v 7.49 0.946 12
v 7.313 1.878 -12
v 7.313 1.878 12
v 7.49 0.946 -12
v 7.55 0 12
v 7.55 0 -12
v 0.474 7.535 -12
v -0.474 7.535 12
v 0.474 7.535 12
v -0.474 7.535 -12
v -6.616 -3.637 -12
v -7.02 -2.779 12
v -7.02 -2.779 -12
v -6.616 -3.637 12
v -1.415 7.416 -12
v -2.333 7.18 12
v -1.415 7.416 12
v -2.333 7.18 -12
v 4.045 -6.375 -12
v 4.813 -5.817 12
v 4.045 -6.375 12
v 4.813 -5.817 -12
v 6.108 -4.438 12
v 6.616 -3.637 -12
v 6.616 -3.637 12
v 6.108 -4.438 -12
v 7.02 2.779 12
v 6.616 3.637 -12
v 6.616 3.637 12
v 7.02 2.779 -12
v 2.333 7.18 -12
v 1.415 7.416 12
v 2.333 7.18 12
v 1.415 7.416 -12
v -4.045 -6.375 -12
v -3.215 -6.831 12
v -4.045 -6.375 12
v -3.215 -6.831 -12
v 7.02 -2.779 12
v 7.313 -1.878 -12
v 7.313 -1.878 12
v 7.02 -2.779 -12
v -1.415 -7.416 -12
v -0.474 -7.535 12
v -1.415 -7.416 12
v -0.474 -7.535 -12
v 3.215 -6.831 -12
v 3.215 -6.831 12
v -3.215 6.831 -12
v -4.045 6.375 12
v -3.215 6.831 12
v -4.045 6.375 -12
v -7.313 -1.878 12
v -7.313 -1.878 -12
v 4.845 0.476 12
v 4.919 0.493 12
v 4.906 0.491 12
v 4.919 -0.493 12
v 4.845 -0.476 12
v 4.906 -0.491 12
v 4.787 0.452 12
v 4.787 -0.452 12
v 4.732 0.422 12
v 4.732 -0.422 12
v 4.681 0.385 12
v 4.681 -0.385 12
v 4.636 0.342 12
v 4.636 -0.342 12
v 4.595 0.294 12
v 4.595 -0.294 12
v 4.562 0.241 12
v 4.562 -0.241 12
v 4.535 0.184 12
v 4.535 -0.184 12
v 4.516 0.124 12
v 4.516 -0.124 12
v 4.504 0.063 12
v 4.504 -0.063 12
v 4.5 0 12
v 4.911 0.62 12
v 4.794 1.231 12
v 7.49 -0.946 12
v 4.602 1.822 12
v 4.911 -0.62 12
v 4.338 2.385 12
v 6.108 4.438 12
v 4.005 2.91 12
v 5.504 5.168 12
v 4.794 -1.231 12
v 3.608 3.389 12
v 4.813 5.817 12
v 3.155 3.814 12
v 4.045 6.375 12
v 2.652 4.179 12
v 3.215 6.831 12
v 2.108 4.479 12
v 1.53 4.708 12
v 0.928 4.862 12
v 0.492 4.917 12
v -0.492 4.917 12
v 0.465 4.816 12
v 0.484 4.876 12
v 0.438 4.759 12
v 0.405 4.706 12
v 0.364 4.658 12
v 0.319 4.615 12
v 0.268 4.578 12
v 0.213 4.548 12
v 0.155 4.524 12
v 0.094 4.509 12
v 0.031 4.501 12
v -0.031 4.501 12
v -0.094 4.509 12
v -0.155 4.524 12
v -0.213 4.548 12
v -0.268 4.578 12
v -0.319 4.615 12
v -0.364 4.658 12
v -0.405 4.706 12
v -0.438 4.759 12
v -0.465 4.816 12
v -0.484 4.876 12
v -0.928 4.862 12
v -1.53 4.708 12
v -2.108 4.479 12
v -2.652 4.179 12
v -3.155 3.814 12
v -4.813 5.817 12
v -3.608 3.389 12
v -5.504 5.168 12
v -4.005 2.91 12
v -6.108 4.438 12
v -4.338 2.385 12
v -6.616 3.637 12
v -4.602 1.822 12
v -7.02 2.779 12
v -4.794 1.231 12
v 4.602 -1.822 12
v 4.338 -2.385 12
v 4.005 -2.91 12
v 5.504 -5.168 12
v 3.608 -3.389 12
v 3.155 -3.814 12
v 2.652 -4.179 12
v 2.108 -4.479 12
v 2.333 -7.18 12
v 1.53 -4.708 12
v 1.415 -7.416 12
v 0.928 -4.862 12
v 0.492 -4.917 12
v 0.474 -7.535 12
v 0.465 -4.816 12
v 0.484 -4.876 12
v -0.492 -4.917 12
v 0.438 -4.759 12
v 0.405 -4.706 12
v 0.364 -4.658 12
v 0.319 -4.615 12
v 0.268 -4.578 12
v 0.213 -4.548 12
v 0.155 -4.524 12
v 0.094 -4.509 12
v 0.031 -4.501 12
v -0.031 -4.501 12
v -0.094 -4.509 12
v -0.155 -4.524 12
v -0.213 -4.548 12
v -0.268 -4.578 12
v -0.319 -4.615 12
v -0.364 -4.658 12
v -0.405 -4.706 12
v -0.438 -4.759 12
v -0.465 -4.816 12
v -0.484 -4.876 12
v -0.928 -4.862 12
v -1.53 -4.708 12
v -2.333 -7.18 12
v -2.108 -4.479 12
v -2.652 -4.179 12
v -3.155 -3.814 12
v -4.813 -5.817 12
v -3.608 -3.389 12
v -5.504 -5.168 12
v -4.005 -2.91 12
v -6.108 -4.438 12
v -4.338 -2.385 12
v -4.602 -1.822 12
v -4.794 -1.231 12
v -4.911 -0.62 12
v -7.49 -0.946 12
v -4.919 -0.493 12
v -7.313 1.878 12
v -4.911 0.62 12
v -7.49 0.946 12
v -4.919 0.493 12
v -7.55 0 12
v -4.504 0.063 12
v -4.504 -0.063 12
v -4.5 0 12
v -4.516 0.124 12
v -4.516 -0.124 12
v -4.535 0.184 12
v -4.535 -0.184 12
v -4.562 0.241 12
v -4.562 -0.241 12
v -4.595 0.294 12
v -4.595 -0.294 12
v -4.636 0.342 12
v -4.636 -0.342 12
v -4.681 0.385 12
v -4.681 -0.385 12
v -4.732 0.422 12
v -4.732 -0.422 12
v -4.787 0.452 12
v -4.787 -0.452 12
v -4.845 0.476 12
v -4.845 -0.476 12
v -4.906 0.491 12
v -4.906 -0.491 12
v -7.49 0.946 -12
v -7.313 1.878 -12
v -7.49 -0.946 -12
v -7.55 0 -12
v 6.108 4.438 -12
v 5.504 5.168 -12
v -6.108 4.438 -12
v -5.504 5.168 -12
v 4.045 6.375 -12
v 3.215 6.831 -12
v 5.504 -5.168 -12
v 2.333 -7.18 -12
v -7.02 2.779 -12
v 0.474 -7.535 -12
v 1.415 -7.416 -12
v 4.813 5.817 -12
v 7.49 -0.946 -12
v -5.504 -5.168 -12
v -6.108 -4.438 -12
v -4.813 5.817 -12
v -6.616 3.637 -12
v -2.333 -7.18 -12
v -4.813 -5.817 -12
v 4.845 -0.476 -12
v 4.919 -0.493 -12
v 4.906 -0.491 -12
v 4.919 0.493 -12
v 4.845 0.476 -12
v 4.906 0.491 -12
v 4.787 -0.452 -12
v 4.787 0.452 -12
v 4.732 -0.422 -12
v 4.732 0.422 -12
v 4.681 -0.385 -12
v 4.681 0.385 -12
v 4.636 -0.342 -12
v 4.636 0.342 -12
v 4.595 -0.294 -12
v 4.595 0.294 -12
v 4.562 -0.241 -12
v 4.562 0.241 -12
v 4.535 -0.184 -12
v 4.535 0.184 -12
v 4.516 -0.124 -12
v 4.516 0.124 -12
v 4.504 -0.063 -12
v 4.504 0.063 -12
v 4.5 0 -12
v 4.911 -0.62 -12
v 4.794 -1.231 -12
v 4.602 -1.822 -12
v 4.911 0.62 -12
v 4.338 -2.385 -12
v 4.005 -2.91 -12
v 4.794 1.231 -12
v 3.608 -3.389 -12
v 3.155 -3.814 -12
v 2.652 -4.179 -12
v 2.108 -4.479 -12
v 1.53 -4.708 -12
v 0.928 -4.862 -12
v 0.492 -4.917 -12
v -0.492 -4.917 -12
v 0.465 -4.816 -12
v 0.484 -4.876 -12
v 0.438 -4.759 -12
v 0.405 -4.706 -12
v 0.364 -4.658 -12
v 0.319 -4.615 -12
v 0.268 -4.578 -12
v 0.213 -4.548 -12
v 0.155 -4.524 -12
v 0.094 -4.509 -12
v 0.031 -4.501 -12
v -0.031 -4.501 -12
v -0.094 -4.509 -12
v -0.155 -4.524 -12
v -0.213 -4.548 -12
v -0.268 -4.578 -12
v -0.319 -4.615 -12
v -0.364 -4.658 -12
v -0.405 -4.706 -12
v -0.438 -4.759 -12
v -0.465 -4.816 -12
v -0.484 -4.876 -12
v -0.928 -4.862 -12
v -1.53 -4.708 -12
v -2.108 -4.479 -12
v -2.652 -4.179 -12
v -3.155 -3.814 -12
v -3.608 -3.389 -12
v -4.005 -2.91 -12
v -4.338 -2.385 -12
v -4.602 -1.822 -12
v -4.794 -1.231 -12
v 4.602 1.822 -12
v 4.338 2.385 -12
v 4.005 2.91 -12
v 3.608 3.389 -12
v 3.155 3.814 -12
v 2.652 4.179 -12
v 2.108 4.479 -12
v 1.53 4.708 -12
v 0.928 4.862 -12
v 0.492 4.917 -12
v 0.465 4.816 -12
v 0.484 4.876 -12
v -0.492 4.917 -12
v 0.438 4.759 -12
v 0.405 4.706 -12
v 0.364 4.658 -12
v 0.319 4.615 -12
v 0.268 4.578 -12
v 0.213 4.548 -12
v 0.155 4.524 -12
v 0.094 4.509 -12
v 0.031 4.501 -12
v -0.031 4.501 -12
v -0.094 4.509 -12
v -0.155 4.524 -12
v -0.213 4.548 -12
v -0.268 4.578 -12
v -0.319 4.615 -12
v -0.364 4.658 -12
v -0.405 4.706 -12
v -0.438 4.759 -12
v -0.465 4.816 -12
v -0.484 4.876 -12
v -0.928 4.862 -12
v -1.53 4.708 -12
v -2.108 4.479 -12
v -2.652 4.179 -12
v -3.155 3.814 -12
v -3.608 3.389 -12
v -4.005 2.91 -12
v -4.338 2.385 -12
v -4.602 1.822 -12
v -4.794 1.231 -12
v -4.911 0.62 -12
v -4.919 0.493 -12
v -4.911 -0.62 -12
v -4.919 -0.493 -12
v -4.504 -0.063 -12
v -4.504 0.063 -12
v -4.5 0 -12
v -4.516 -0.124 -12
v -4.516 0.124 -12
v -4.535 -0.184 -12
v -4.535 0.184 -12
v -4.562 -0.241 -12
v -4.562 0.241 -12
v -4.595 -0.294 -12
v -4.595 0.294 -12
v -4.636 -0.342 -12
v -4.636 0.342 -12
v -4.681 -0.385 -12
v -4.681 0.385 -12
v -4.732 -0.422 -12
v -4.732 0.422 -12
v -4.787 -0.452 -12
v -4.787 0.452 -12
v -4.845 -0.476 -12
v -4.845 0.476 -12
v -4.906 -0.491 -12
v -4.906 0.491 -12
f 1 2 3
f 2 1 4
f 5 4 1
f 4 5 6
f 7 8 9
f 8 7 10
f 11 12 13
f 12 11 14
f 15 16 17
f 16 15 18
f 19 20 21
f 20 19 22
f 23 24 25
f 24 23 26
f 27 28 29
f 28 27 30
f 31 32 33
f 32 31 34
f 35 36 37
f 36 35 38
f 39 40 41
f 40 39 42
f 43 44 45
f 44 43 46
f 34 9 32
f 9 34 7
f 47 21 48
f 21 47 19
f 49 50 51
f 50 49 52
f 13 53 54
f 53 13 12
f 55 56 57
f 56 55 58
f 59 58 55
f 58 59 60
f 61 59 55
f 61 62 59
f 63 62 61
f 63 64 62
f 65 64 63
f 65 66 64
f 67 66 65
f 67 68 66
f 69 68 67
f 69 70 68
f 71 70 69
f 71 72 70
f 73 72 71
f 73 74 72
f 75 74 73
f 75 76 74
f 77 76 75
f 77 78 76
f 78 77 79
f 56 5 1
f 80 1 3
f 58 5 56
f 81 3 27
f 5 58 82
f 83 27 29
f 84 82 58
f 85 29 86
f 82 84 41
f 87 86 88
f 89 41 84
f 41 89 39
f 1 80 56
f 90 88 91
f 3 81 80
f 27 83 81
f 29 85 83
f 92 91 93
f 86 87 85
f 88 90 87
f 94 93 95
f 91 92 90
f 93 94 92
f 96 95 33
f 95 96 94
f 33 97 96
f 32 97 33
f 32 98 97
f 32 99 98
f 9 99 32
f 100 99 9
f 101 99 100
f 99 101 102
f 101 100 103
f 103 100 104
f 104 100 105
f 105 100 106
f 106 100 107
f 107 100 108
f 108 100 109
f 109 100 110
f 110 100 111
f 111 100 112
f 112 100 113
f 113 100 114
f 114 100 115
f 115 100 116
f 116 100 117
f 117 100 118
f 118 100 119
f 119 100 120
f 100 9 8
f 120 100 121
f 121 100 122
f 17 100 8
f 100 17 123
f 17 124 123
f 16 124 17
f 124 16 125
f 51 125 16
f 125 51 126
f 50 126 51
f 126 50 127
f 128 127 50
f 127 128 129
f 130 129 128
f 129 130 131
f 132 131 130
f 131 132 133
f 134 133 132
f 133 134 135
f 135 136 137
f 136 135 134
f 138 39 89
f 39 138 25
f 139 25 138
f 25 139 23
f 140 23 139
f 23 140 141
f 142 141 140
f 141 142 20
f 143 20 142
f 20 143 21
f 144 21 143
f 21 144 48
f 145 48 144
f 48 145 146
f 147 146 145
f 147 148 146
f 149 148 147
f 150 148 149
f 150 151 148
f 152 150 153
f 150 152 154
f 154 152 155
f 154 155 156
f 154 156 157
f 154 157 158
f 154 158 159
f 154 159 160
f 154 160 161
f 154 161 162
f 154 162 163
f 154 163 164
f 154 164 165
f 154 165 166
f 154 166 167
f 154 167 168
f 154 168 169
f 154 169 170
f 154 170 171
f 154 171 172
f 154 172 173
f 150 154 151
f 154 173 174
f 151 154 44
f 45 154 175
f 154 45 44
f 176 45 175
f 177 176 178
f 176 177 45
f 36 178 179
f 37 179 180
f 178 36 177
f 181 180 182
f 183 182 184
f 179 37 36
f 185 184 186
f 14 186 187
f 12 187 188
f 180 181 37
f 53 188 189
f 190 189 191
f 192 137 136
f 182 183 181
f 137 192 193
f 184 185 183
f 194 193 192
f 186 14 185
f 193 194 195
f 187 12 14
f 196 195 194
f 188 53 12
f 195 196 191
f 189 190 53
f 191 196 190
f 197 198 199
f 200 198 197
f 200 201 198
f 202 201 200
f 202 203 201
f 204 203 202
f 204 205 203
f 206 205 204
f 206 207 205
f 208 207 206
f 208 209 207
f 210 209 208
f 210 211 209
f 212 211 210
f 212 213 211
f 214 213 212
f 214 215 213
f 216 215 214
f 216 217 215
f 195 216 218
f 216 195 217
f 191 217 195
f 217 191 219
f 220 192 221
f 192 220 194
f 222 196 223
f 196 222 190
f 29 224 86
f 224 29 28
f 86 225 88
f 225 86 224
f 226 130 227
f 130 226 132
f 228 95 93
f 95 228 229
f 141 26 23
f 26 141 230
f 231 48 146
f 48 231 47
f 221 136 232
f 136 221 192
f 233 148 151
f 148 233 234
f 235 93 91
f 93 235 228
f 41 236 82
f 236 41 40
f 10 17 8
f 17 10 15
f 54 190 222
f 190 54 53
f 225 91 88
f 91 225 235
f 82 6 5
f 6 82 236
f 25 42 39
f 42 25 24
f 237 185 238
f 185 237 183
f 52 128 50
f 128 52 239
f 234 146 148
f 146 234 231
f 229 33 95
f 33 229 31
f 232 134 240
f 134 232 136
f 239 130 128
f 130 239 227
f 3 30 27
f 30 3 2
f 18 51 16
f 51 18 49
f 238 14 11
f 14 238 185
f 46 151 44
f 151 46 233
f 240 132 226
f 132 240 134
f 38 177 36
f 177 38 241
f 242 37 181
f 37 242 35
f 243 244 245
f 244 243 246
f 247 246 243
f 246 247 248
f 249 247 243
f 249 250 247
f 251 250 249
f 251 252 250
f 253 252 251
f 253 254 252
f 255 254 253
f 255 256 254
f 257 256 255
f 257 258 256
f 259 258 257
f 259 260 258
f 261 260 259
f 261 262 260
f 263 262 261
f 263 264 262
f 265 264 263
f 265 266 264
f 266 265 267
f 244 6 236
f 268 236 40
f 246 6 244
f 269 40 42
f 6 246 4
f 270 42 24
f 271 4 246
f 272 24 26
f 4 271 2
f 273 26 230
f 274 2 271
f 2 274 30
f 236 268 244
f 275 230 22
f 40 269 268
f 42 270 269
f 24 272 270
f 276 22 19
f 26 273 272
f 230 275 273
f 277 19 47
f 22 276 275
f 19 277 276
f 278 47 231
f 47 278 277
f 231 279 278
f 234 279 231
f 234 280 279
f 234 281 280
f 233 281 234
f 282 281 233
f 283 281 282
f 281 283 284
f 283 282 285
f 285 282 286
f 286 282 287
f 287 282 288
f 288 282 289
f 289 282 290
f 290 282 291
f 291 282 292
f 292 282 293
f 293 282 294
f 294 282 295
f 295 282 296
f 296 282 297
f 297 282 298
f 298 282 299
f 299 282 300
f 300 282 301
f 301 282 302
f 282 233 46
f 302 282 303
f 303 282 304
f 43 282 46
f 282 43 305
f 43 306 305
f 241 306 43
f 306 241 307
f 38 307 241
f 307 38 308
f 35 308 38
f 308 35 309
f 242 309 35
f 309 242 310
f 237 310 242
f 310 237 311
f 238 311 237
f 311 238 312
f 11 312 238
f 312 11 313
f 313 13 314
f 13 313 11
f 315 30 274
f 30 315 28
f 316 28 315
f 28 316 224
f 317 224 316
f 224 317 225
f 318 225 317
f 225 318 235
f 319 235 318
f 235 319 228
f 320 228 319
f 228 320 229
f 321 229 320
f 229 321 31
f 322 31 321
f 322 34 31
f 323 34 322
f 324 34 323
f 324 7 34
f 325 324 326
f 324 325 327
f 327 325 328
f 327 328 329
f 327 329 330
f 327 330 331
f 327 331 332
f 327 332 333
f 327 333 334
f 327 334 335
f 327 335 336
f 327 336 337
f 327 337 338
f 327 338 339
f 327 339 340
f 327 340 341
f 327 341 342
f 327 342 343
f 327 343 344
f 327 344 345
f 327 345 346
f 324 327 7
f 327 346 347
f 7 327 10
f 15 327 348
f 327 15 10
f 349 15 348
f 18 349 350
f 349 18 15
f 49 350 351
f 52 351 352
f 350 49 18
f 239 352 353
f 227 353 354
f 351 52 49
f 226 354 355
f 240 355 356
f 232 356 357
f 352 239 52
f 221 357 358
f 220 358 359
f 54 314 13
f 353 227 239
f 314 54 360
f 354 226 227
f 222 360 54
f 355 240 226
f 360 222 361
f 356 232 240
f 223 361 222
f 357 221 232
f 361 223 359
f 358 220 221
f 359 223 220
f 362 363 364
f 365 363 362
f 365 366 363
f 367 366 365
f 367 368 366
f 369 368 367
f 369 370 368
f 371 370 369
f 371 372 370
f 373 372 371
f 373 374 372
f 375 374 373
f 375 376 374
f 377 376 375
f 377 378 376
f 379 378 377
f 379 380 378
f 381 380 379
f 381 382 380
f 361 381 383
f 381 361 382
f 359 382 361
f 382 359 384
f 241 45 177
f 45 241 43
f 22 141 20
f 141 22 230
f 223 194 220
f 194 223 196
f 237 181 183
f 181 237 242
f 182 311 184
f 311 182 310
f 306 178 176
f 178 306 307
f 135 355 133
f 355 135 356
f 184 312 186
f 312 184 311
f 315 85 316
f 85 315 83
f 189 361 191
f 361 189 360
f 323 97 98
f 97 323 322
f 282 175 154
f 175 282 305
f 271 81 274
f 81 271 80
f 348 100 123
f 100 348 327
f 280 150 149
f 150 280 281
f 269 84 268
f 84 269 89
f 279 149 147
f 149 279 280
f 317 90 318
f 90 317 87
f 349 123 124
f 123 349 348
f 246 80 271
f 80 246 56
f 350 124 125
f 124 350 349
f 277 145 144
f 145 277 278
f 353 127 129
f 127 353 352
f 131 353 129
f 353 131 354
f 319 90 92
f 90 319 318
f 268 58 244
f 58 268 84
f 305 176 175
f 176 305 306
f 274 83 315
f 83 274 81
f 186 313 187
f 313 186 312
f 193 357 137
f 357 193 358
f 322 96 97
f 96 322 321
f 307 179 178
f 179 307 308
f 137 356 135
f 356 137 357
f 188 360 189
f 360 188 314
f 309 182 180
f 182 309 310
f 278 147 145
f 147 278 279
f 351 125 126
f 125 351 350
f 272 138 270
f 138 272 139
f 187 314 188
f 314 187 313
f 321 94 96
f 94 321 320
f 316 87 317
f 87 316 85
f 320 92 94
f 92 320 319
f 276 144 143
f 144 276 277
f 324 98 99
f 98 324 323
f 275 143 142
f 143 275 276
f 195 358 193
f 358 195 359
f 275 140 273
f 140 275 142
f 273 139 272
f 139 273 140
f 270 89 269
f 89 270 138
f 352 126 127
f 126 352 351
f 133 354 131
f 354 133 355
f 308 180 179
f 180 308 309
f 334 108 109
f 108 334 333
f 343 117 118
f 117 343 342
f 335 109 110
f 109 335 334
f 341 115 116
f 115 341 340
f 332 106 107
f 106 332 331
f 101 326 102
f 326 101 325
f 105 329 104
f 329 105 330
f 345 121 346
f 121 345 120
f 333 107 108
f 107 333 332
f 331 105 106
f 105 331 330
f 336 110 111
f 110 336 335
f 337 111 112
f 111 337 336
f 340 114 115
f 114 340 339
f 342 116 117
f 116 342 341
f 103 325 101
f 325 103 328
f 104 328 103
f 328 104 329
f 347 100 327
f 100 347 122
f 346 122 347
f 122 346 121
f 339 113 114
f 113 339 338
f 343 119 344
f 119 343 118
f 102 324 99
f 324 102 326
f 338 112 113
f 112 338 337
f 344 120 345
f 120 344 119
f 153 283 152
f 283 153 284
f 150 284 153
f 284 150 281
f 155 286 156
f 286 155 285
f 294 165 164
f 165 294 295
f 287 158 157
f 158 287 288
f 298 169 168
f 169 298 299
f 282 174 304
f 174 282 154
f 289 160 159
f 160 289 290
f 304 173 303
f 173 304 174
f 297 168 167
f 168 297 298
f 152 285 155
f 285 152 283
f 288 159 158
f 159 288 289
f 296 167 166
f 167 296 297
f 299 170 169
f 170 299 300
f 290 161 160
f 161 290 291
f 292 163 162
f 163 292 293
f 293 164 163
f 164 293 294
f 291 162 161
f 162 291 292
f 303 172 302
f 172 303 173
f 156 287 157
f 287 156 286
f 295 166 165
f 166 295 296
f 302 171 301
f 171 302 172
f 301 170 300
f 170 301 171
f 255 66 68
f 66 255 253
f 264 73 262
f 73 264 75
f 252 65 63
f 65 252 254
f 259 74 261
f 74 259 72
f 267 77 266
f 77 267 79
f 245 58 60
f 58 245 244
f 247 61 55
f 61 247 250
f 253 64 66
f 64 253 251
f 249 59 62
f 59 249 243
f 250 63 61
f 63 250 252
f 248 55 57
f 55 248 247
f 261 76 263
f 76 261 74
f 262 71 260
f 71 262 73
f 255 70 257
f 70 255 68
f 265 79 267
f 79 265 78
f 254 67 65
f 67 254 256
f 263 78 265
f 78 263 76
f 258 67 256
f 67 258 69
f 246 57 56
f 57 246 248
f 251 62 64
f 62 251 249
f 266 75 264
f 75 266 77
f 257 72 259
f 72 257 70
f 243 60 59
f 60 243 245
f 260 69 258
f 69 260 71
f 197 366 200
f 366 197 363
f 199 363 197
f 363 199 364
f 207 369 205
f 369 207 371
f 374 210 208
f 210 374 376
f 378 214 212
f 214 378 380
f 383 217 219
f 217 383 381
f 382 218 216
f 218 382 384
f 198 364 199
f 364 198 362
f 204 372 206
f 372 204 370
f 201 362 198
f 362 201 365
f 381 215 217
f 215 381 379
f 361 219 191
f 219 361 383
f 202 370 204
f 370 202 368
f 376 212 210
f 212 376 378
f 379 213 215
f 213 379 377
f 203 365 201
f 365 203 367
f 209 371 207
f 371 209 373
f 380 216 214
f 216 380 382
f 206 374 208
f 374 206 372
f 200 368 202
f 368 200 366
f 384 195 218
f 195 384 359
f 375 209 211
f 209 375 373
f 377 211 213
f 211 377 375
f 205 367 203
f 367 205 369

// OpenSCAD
// https://www.thingiverse.com/thing:2523257
// Spark Plug Socket Insert
// Copyright 2017 - Andrew Cutler. License Creative Commons Attribution.
// print with flexible filament
// suggested 2 perimeters, 20 % infill

// tolerance adjustment to make for a tight fit
fudge = 0.1;

// outer diameter (socket)
o_d = 15.0;

// inner diameter (spark plug)
i_d = 10.0;

// length of socket insert
length = 24.0;

// inner bumps diameter
bump_diameter = 1.0;

/* [Hidden] */
pad = 0.001;
$fn = 50;


module bump() {
     cylinder(d=bump_diameter, h=length, center=true);
}


union() {
    difference() {
        cylinder(d=o_d+fudge, h=length, center=true);
        cylinder(d=i_d-fudge, h=length+pad, center=true);
    }

    translate([0,i_d/2,0]) bump();
    translate([0,-i_d/2,0]) bump();
    translate([i_d/2,,0]) bump();
    translate([-i_d/2,,0]) bump();
}
